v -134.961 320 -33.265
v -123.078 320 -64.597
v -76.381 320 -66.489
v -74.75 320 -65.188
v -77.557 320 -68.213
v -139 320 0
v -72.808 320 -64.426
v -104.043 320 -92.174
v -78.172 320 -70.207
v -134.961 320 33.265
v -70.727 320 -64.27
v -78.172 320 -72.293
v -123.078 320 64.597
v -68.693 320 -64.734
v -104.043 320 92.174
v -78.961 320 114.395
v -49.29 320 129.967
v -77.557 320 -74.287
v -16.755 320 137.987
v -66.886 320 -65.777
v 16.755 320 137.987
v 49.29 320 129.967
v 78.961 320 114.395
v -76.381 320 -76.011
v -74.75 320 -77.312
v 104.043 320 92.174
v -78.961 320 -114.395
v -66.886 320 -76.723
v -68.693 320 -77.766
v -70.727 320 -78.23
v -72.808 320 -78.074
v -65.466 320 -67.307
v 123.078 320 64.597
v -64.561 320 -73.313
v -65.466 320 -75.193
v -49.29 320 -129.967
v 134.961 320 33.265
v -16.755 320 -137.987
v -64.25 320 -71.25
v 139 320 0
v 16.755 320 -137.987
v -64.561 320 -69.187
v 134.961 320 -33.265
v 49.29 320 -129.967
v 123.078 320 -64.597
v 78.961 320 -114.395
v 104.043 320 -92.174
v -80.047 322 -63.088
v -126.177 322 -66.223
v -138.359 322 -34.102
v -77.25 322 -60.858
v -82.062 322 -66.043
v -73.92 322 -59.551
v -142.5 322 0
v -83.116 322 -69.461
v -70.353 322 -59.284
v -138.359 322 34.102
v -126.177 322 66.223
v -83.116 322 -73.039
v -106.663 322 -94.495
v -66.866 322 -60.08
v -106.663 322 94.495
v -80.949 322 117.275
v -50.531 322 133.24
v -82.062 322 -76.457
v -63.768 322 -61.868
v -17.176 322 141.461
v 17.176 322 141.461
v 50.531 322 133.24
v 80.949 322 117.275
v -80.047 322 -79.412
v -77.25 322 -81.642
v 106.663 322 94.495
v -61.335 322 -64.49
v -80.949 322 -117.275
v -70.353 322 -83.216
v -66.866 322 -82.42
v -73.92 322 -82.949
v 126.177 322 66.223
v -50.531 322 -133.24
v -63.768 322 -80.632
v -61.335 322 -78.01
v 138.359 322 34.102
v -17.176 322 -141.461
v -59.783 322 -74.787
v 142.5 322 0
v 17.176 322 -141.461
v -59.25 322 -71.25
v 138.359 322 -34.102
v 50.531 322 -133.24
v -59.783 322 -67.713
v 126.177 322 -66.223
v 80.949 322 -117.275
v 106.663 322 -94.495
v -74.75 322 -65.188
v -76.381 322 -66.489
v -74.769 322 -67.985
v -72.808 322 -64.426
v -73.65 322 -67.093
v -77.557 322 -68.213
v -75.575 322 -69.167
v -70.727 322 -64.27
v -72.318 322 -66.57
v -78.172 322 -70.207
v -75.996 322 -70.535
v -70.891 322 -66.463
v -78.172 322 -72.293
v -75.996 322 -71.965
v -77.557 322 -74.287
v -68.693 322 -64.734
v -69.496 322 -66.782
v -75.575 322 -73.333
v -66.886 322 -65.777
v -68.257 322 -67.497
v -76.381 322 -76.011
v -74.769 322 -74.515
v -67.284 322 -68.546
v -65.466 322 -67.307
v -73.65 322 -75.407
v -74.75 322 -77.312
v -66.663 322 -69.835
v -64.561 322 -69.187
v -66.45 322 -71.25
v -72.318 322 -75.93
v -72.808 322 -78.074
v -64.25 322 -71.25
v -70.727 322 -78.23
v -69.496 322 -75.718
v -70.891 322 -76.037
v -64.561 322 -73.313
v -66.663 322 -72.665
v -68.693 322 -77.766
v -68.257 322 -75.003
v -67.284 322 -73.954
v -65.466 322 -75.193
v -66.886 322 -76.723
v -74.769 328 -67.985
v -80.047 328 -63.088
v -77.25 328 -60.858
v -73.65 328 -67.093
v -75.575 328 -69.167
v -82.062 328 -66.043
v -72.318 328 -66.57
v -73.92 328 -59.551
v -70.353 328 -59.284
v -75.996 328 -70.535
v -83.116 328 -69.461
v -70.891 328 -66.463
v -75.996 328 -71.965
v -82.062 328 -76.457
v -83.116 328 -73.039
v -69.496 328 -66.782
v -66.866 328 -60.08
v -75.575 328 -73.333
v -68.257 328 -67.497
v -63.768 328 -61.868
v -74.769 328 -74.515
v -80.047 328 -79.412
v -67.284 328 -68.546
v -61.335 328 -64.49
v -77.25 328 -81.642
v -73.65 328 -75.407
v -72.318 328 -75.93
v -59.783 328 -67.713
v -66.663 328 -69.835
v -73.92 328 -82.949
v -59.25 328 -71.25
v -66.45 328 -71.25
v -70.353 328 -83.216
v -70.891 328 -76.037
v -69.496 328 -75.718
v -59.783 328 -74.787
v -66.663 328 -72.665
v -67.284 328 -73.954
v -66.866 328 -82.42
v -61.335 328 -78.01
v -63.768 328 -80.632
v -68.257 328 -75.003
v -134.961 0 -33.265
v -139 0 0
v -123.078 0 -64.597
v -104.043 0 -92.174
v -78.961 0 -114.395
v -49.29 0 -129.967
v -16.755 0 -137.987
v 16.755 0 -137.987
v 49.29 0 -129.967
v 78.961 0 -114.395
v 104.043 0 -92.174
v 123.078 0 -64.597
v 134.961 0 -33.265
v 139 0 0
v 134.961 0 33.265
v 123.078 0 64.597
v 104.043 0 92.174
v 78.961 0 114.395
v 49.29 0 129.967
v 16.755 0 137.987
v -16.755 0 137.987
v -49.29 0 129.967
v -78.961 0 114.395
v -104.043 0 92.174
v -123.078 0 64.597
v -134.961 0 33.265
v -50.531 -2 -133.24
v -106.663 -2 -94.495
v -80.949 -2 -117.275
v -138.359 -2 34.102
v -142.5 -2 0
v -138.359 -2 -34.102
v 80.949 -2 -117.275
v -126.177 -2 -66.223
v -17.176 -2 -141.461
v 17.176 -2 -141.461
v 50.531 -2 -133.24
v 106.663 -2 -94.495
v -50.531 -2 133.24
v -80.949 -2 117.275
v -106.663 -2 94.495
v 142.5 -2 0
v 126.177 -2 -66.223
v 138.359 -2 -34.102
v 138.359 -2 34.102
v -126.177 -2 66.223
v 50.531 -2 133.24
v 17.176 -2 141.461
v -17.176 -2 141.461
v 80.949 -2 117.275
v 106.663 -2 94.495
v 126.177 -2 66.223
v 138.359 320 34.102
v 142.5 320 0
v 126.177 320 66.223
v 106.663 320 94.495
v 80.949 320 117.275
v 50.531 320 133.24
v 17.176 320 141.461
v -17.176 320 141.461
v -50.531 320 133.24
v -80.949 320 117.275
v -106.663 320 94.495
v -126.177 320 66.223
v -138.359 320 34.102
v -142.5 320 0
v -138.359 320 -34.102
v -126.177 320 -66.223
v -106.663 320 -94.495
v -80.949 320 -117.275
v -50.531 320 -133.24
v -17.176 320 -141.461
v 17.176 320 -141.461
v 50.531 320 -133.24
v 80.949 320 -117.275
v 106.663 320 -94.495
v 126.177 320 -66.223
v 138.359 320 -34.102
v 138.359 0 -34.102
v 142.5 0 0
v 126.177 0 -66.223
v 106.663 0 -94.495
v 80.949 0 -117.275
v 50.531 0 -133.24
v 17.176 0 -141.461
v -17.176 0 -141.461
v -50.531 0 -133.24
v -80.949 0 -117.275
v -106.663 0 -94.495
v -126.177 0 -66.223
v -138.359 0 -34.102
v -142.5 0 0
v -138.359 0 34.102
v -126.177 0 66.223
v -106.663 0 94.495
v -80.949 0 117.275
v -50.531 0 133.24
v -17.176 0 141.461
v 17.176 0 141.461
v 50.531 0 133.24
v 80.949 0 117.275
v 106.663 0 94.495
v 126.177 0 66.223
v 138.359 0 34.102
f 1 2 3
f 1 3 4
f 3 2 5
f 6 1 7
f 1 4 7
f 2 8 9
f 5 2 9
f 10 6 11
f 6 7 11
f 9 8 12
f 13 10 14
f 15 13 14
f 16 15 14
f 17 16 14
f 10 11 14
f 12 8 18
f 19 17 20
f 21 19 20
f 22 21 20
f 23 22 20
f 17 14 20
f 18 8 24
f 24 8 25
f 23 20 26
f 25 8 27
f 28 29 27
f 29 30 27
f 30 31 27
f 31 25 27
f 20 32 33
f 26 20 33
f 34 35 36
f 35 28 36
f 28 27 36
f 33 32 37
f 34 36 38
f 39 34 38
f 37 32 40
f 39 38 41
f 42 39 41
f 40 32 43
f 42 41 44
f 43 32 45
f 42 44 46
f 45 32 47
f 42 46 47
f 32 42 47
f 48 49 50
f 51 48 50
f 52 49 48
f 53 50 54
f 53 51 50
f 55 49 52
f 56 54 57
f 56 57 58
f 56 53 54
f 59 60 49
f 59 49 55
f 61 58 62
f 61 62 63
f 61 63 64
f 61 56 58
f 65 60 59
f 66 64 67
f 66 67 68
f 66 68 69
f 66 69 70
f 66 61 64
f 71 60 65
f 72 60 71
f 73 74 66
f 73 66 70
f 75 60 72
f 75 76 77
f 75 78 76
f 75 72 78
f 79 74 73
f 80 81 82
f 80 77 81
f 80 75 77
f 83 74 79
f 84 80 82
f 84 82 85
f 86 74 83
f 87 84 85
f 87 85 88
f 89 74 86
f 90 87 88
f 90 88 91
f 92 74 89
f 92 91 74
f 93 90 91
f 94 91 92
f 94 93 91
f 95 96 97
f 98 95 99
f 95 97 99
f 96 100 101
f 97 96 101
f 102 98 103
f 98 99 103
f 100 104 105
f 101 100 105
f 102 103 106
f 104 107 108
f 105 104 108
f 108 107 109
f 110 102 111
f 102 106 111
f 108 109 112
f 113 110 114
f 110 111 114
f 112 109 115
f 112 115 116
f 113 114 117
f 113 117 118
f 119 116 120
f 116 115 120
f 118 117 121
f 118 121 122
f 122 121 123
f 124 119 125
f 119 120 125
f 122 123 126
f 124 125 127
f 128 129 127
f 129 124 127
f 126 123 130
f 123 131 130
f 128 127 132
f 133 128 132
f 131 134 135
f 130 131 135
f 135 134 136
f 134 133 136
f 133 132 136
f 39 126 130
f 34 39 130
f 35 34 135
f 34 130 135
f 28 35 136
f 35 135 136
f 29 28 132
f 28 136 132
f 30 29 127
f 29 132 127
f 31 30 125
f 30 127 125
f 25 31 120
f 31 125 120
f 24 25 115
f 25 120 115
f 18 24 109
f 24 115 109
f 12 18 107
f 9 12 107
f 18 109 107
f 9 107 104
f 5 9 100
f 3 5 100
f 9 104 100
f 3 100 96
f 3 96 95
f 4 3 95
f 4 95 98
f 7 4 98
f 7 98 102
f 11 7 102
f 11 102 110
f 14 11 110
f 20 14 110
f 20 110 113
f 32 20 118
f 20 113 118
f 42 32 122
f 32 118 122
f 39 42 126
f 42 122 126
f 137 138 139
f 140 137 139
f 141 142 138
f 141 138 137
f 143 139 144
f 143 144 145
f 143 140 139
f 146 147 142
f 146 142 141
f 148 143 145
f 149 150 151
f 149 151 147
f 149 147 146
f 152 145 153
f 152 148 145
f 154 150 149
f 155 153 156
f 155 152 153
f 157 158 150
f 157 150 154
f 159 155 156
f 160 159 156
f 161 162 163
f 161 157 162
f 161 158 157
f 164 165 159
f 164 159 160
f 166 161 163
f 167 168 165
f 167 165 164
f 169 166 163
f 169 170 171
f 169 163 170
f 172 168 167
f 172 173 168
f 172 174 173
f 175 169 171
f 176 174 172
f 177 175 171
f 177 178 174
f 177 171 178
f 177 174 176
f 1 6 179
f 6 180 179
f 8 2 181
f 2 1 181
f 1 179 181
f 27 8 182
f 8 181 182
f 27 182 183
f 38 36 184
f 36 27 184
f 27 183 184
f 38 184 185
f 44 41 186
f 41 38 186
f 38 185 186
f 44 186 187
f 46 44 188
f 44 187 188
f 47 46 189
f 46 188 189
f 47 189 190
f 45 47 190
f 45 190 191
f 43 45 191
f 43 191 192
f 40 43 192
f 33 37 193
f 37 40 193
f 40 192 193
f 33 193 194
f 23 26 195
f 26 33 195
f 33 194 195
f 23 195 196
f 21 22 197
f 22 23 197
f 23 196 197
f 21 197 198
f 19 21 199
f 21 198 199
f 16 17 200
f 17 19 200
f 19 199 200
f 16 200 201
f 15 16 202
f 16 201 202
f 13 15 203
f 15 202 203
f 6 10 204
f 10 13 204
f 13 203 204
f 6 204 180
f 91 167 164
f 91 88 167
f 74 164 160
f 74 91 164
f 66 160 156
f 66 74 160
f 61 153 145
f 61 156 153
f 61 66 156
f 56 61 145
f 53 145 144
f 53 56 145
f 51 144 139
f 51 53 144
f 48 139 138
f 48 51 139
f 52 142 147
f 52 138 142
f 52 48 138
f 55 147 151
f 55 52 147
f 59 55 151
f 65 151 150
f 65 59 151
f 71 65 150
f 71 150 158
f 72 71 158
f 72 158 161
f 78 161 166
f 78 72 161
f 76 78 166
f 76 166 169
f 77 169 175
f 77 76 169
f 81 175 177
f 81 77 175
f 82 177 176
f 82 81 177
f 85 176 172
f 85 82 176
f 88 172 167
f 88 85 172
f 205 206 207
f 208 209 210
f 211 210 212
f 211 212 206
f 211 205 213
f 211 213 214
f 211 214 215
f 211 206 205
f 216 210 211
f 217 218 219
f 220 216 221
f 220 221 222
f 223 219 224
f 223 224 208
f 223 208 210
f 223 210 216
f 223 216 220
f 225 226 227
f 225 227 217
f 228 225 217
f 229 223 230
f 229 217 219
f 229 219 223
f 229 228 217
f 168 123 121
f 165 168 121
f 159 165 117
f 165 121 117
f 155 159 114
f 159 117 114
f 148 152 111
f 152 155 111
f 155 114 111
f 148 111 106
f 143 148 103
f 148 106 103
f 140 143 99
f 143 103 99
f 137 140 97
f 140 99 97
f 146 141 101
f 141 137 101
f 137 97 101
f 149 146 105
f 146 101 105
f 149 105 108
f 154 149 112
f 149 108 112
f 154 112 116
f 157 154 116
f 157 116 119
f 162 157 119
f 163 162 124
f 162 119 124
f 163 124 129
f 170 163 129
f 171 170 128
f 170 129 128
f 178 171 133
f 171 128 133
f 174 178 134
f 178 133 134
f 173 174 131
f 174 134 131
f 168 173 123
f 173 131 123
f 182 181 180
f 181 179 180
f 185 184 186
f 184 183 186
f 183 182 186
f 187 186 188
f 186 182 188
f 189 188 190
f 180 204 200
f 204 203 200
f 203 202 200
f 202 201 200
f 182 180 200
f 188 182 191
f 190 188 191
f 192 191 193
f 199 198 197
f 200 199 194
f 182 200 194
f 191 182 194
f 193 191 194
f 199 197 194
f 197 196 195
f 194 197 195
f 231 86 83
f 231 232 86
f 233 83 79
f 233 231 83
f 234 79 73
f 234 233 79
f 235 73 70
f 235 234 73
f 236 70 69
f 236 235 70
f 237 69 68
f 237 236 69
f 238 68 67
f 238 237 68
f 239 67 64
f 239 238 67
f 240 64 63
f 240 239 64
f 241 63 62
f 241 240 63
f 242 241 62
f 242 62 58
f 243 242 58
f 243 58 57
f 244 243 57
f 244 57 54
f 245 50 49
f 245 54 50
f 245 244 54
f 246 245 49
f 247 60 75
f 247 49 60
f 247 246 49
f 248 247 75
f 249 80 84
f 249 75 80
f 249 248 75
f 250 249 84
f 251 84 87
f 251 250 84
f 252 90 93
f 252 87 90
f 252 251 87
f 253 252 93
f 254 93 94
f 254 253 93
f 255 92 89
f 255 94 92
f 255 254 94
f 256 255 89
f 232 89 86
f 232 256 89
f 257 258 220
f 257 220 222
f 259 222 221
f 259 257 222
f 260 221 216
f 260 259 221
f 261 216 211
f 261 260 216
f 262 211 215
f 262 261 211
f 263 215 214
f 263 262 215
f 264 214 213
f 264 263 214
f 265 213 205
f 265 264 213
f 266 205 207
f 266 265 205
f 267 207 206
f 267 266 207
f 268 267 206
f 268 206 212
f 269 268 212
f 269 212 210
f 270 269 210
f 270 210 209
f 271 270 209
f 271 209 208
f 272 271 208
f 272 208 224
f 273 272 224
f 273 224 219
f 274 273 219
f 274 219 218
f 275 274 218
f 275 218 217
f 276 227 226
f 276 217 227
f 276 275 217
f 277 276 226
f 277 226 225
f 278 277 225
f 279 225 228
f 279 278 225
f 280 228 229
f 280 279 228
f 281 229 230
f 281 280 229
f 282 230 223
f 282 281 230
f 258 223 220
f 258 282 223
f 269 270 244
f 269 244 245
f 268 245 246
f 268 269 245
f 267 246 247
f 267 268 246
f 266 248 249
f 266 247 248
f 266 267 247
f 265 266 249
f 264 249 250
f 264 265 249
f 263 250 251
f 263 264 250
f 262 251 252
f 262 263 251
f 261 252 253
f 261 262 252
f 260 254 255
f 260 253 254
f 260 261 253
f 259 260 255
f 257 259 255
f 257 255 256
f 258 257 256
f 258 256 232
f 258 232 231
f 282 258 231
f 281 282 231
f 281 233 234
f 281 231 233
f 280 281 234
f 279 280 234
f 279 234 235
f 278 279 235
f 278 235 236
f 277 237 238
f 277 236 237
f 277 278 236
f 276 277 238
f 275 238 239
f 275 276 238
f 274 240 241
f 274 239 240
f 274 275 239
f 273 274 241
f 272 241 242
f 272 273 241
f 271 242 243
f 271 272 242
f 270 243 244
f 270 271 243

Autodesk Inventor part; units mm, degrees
ref_plane "YZ Plane" through (0, 0, 0) normal (1, 0, 0) x (0, 1, 0)
ref_plane "XZ Plane" through (0, 0, 0) normal (0, 1, 0) x (-1, 0, 0)
ref_plane "XY Plane" through (0, 0, 0) normal (0, 0, 1) x (1, 0, 0)
sketch "Sketch1" plane through (0, 0, 0) normal (0, 1, 0) x (-1, 0, 0)
  circle A0 centre (0, 0) radius 142.5
  circle A1 centre (0, 0) radius 139
  dimension "d0" = 285
  dimension "d1" = 278
extrude "Extrusion1" add sketch "Sketch1" along normal blind 320
sketch "Sketch2" plane through (0, 0, 0) normal (0, -1, 0) x (1, 0, 0)
  circle A0 centre (0, 0) radius 142.5
extrude "Extrusion2" add sketch "Sketch2" along normal blind 2
sketch "Sketch3" plane through (0, 320, 0) normal (0, 1, 0) x (1, 0, 0)
  circle A0 centre (0, 0) radius 142.5
extrude "Extrusion3" add sketch "Sketch3" along normal blind 2
sketch "Sketch4" plane through (0, 322, 0) normal (0, 1, 0) x (1, 0, 0)
  circle A0 centre (0, 0) radius 142.5 construction
  line L0 (0, -142.5) -> (0, 142.5) construction
  line L1 (-142.5, 0) -> (142.5, 0) construction
  line L2 (0, 142.5) -> (-142.5, 0) construction
  line L3 (0, 0) -> (-98.2878, 98.2878) construction
  circle A1 centre (0, 0) radius 139 construction
  circle A2 centre (-71.25, 71.25) radius 7
  dimension "d8" = 14
extrude "Extrusion9" cut sketch "Sketch4" against normal blind 10
sketch "Sketch8" plane through (0, 322, 0) normal (0, 1, 0) x (1, 0, 0)
  circle A0 centre (-71.25, 71.25) radius 7 projected
  circle A1 centre (-71.25, 71.25) radius 4.8
  circle A2 centre (-71.25, 71.25) radius 12
  point P0 (0, 0)
  dimension "d25" = 9.6
  dimension "d26" = 24
extrude "Extrusion10" add sketch "Sketch8" along normal blind 6 contours A0 | A2
properties part number "FermentingTun"
